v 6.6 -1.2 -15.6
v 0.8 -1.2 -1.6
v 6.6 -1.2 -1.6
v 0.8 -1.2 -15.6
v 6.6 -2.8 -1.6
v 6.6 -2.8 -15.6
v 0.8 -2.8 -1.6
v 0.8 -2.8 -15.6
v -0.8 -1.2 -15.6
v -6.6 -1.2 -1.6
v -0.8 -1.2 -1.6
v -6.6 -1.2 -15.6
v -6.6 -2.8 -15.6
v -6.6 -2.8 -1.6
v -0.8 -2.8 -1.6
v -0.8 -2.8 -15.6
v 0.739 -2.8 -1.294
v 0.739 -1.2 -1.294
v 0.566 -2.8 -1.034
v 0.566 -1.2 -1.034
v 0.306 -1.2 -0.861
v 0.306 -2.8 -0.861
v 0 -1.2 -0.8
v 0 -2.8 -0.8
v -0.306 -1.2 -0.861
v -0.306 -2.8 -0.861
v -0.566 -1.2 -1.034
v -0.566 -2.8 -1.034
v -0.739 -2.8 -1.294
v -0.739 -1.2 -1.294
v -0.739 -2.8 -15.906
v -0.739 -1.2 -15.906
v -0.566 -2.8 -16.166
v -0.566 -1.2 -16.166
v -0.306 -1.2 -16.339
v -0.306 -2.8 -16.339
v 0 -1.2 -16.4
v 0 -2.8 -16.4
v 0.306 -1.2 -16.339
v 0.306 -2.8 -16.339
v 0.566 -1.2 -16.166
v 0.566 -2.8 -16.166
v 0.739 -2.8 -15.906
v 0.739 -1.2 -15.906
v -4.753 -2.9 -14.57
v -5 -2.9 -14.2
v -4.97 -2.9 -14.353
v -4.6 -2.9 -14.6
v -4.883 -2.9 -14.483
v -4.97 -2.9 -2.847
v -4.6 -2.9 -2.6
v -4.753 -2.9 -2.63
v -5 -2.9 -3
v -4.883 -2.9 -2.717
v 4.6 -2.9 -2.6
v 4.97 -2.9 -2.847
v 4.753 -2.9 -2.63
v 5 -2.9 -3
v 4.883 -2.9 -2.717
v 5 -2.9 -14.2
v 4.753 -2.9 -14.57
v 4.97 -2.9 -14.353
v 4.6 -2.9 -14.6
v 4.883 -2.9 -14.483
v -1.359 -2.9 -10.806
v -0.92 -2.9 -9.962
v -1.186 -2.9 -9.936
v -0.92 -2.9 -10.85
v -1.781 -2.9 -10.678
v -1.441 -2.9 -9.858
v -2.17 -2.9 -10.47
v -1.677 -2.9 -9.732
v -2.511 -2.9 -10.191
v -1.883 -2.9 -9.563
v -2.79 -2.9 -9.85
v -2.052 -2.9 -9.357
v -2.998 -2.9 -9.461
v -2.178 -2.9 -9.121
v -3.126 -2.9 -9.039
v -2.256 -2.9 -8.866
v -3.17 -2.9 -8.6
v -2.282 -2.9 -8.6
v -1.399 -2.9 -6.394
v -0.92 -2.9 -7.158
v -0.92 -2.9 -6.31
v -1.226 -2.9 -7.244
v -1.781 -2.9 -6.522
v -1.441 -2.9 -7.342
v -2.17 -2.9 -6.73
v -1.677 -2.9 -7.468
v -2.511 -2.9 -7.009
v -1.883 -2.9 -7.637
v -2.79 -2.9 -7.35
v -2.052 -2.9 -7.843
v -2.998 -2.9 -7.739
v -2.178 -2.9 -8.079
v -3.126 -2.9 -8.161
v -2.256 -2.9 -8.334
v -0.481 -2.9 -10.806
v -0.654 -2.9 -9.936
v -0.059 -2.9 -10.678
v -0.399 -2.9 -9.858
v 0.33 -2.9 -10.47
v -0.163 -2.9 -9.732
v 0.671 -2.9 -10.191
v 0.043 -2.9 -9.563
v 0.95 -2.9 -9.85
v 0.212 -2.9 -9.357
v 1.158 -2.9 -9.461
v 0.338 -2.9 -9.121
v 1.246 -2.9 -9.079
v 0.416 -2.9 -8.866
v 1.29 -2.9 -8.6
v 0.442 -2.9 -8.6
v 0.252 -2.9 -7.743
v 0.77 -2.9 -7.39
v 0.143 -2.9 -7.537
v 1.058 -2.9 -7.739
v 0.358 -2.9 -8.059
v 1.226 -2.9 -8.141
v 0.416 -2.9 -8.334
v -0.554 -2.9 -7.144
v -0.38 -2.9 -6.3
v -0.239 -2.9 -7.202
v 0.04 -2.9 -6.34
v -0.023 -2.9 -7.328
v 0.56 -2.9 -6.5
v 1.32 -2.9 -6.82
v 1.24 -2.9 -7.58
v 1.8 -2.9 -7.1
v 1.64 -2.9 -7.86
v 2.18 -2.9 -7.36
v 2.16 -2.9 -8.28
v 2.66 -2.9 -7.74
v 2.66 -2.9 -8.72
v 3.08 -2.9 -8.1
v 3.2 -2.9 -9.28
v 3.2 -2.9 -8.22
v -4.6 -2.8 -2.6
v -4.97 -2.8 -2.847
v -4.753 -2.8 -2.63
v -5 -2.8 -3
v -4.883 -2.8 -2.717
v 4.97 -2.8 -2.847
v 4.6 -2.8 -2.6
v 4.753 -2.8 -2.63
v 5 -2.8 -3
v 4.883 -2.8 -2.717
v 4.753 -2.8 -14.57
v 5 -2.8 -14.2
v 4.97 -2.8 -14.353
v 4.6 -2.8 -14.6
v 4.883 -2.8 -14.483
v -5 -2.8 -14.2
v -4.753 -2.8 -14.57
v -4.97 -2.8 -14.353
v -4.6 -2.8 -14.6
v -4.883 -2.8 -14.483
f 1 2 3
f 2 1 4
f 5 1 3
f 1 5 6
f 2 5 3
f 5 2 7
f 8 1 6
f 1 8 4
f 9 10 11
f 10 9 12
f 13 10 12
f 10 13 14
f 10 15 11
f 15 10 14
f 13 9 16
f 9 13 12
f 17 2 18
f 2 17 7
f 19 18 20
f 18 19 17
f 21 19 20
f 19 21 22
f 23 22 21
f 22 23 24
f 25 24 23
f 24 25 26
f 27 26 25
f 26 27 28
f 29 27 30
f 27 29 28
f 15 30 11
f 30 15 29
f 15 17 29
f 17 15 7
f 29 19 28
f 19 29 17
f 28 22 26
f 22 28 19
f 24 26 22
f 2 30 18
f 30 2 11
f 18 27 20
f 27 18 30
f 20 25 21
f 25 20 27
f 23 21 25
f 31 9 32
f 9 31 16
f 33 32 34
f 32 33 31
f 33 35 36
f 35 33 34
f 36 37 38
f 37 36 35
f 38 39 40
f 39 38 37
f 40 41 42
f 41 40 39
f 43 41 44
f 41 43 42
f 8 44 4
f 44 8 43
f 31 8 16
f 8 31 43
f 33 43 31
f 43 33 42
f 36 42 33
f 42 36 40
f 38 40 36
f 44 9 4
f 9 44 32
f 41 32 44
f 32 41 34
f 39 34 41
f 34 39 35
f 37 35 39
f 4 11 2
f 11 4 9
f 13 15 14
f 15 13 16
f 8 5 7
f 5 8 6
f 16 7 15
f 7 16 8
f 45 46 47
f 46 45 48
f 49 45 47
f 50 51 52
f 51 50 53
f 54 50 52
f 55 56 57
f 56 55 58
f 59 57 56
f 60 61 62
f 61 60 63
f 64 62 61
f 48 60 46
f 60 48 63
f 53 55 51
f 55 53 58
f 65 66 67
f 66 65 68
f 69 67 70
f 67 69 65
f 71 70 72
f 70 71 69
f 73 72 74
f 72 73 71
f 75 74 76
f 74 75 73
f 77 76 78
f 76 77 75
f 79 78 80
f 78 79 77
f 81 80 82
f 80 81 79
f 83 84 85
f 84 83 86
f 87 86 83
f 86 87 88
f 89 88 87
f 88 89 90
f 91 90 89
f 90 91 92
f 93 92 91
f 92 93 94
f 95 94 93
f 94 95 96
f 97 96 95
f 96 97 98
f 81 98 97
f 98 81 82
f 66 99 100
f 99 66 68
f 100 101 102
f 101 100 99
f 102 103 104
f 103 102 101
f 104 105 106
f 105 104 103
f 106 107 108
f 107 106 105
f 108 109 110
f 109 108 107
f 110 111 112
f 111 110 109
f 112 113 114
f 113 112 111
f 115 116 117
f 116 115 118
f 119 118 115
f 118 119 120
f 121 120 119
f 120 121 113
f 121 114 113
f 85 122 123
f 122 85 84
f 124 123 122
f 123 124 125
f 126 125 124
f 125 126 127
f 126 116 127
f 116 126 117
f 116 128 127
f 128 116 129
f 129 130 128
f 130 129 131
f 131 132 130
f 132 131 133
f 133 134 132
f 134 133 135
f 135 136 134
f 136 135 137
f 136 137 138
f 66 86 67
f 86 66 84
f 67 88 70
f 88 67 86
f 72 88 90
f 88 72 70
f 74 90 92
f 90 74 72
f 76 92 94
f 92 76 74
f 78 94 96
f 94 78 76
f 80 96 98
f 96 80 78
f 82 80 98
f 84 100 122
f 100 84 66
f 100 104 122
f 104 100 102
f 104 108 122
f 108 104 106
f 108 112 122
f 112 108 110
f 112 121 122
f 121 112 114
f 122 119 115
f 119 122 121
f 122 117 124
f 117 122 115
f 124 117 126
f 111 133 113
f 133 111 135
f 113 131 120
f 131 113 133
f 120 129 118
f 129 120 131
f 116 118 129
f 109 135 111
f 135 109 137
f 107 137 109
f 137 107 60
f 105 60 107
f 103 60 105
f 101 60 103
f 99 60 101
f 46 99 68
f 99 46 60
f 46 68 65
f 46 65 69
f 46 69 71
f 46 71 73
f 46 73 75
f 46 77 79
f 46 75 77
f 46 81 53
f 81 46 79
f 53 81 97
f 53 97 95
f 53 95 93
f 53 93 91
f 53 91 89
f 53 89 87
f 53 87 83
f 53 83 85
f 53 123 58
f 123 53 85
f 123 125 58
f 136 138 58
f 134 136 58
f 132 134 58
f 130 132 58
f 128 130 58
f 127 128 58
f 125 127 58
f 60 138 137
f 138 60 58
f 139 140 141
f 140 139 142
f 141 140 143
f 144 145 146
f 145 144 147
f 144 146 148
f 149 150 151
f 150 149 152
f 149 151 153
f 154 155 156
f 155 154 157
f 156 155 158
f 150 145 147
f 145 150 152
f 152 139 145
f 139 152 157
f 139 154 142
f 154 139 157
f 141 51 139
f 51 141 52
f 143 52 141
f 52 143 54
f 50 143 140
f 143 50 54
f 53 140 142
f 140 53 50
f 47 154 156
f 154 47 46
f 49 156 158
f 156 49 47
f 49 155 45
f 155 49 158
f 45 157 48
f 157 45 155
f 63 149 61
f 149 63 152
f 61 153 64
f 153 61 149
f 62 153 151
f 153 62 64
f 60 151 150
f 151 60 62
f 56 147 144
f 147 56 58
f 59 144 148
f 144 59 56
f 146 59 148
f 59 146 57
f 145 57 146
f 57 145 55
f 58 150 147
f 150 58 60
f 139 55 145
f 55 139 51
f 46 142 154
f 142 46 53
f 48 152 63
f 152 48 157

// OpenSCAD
// file: ../p/2-4edge.scad
use <../lib.scad>
function ldraw_lib__2_4edge() = [
// 0 Circle 0.5
// 0 Name: 2-4edge.dat
// 0 Author: James Jessiman
// 0 !LDRAW_ORG Primitive UPDATE 2017-01
// 0 !LICENSE Licensed under CC BY 4.0 : see CAreadme.txt
// 
// 0 BFC CERTIFY CCW
  [0,"BFC","CERTIFY"],
  [0,"BFC","CCW"],
// 
// 0 !HISTORY 2007-06-24 [PTadmin] Header formatted for Contributor Agreement
// 0 !HISTORY 2008-07-01 [PTadmin] Official Update 2008-01
// 0 !HISTORY 2017-01-15 [Steffen] BFCed
// 0 !HISTORY 2017-12-30 [PTadmin] Official Update 2017-01
// 
// 
// 2 24 1 0 0 0.9239 0 0.3827
  [2,24,1,0,0,0.9239,0,0.3827],
// 2 24 0.9239 0 0.3827 0.7071 0 0.7071
  [2,24,0.9239,0,0.3827,0.7071,0,0.7071],
// 2 24 0.7071 0 0.7071 0.3827 0 0.9239
  [2,24,0.7071,0,0.7071,0.3827,0,0.9239],
// 2 24 0.3827 0 0.9239 0 0 1
  [2,24,0.3827,0,0.9239,0,0,1],
// 2 24 0 0 1 -0.3827 0 0.9239
  [2,24,0,0,1,-0.3827,0,0.9239],
// 2 24 -0.3827 0 0.9239 -0.7071 0 0.7071
  [2,24,-0.3827,0,0.9239,-0.7071,0,0.7071],
// 2 24 -0.7071 0 0.7071 -0.9239 0 0.3827
  [2,24,-0.7071,0,0.7071,-0.9239,0,0.3827],
// 2 24 -0.9239 0 0.3827 -1 0 0
  [2,24,-0.9239,0,0.3827,-1,0,0],
];
module ldraw_lib__2_4edge(step=0, col=false, unit=2/5, alt=false, line=0.2, solid=!$preview)
    makepoly(ldraw_lib__2_4edge(), step=step, col=col, unit=unit, alt=alt, line=line, solid=solid);
ldraw_lib__2_4edge(line=0.2);
// file: ../p/2-4cyli.scad
use <../lib.scad>
function ldraw_lib__2_4cyli() = [
// 0 Cylinder 0.5
// 0 Name: 2-4cyli.dat
// 0 Author: James Jessiman
// 0 !LDRAW_ORG Primitive UPDATE 2005-01
// 0 !LICENSE Licensed under CC BY 4.0 : see CAreadme.txt
// 
// 0 BFC CERTIFY CCW
  [0,"BFC","CERTIFY"],
  [0,"BFC","CCW"],
// 
// 0 !HISTORY 2002-03-23 [sbliss] Added BFC statement; compacted code
// 0 !HISTORY 2002-04-25 [PTadmin] Official Update 2002-02
// 0 !HISTORY 2004-12-11 [nielsk] Recreated using Primitive Generator, Edge lines fixed, BFC changed to CCW
// 0 !HISTORY 2005-12-28 [PTadmin] Official Update 2005-01
// 0 !HISTORY 2007-06-24 [PTadmin] Header formatted for Contributor Agreement
// 0 !HISTORY 2008-07-01 [PTadmin] Official Update 2008-01
// 
// 
// 4 16 .9239 1 .3827 .9239 0 .3827 1 0 0 1 1 0
  [4,16,.9239,1,.3827,.9239,0,.3827,1,0,0,1,1,0],
// 4 16 .7071 1 .7071 .7071 0 .7071 .9239 0 .3827 .9239 1 .3827
  [4,16,.7071,1,.7071,.7071,0,.7071,.9239,0,.3827,.9239,1,.3827],
// 4 16 .3827 1 .9239 .3827 0 .9239 .7071 0 .7071 .7071 1 .7071
  [4,16,.3827,1,.9239,.3827,0,.9239,.7071,0,.7071,.7071,1,.7071],
// 4 16 0 1 1 0 0 1 .3827 0 .9239 .3827 1 .9239
  [4,16,0,1,1,0,0,1,.3827,0,.9239,.3827,1,.9239],
// 4 16 -.3827 1 .9239 -.3827 0 .9239 0 0 1 0 1 1
  [4,16,-.3827,1,.9239,-.3827,0,.9239,0,0,1,0,1,1],
// 4 16 -.7071 1 .7071 -.7071 0 .7071 -.3827 0 .9239 -.3827 1 .9239
  [4,16,-.7071,1,.7071,-.7071,0,.7071,-.3827,0,.9239,-.3827,1,.9239],
// 4 16 -.9239 1 .3827 -.9239 0 .3827 -.7071 0 .7071 -.7071 1 .7071
  [4,16,-.9239,1,.3827,-.9239,0,.3827,-.7071,0,.7071,-.7071,1,.7071],
// 4 16 -1 1 0 -1 0 0 -.9239 0 .3827 -.9239 1 .3827
  [4,16,-1,1,0,-1,0,0,-.9239,0,.3827,-.9239,1,.3827],
// 5 24 1 1 0 1 0 0 1 1 -.4142 .9239 1 .3827
  [5,24,1,1,0,1,0,0,1,1,-.4142,.9239,1,.3827],
// 5 24 .9239 1 .3827 .9239 0 .3827 1 1 0 .7071 1 .7071
  [5,24,.9239,1,.3827,.9239,0,.3827,1,1,0,.7071,1,.7071],
// 5 24 .7071 1 .7071 .7071 0 .7071 .9239 1 .3827 .3827 1 .9239
  [5,24,.7071,1,.7071,.7071,0,.7071,.9239,1,.3827,.3827,1,.9239],
// 5 24 .3827 1 .9239 .3827 0 .9239 .7071 1 .7071 0 1 1
  [5,24,.3827,1,.9239,.3827,0,.9239,.7071,1,.7071,0,1,1],
// 5 24 0 1 1 0 0 1 .3827 1 .9239 -.3827 1 .9239
  [5,24,0,1,1,0,0,1,.3827,1,.9239,-.3827,1,.9239],
// 5 24 -.3827 1 .9239 -.3827 0 .9239 0 1 1 -.7071 1 .7071
  [5,24,-.3827,1,.9239,-.3827,0,.9239,0,1,1,-.7071,1,.7071],
// 5 24 -.7071 1 .7071 -.7071 0 .7071 -.3827 1 .9239 -.9239 1 .3827
  [5,24,-.7071,1,.7071,-.7071,0,.7071,-.3827,1,.9239,-.9239,1,.3827],
// 5 24 -.9239 1 .3827 -.9239 0 .3827 -.7071 1 .7071 -1 1 0
  [5,24,-.9239,1,.3827,-.9239,0,.3827,-.7071,1,.7071,-1,1,0],
// 5 24 -1 1 0 -1 0 0 -.9239 1 .3827 -1 1 -.4142
  [5,24,-1,1,0,-1,0,0,-.9239,1,.3827,-1,1,-.4142],
// 0
];
module ldraw_lib__2_4cyli(step=0, col=false, unit=2/5, alt=false, line=0.2, solid=!$preview)
    makepoly(ldraw_lib__2_4cyli(), step=step, col=col, unit=unit, alt=alt, line=line, solid=solid);
ldraw_lib__2_4cyli(line=0.2);
// file: ../p/box4-4a.scad
use <../lib.scad>
function ldraw_lib__box4_4a() = [
// 0 Box with  4 Faces without  4 Adjacent Edges
// 0 Name: box4-4a.dat
// 0 Author: Willy Tschager [Holly-Wood]
// 0 !LDRAW_ORG Primitive UPDATE 2024-01
// 0 !LICENSE Licensed under CC BY 4.0 : see CAreadme.txt
// 
// 0 BFC CERTIFY CCW
  [0,"BFC","CERTIFY"],
  [0,"BFC","CCW"],
// 
// 0 !HISTORY 1998-07-15 [PTadmin] Official Update 1998-07
// 0 !HISTORY 2002-12-13 [hafhead] Made BFC compliant
// 0 !HISTORY 2003-03-12 [PTadmin] Official Update 2003-01
// 0 !HISTORY 2007-06-24 [PTadmin] Header formatted for Contributor Agreement
// 0 !HISTORY 2008-07-01 [PTadmin] Official Update 2008-01
// 0 !HISTORY 2012-02-16 [Philo] Changed to CCW
// 0 !HISTORY 2012-03-30 [PTadmin] Official Update 2012-01
// 0 !HISTORY 2024-01-03 [Holly-Wood] Complete re-write, original by Manfred Moolhuysen
// 0 !HISTORY 2024-01-29 [OrionP] Official Update 2024-01
// 
// 2 24 -1 1 -1 -1 1 1
  [2,24,-1,1,-1,-1,1,1],
// 2 24 1 1 1 1 1 -1
  [2,24,1,1,1,1,1,-1],
// 2 24 -1 1 1 1 1 1
  [2,24,-1,1,1,1,1,1],
// 4 16 1 1 1 1 1 -1 -1 1 -1 -1 1 1
  [4,16,1,1,1,1,1,-1,-1,1,-1,-1,1,1],
// 
// 2 24 -1 0 -1 -1 0 1
  [2,24,-1,0,-1,-1,0,1],
// 4 16 -1 1 1 -1 1 -1 -1 0 -1 -1 0 1
  [4,16,-1,1,1,-1,1,-1,-1,0,-1,-1,0,1],
// 
// 2 24 1 0 1 1 0 -1
  [2,24,1,0,1,1,0,-1],
// 4 16 1 1 -1 1 1 1 1 0 1 1 0 -1
  [4,16,1,1,-1,1,1,1,1,0,1,1,0,-1],
// 
// 2 24 1 1 1 1 0 1
  [2,24,1,1,1,1,0,1],
// 2 24 -1 1 1 -1 0 1
  [2,24,-1,1,1,-1,0,1],
// 2 24 -1 0 1 1 0 1
  [2,24,-1,0,1,1,0,1],
// 4 16 1 1 1 -1 1 1 -1 0 1 1 0 1
  [4,16,1,1,1,-1,1,1,-1,0,1,1,0,1],
];
module ldraw_lib__box4_4a(step=0, col=false, unit=2/5, alt=false, line=0.2, solid=!$preview)
    makepoly(ldraw_lib__box4_4a(), step=step, col=col, unit=unit, alt=alt, line=line, solid=solid);
ldraw_lib__box4_4a(line=0.2);
// file: ../p/2-4cylo.scad
use <../lib.scad>
use <2-4cyli.scad>
use <2-4edge.scad>
function ldraw_lib__2_4cylo() = [
// 0 Cylinder Open 0.5
// 0 Name: 2-4cylo.dat
// 0 Author: Max Martin Richter [MMR1988]
// 0 !LDRAW_ORG Primitive UPDATE 2010-03
// 0 !LICENSE Licensed under CC BY 4.0 : see CAreadme.txt
// 
// 0 BFC CERTIFY CCW
  [0,"BFC","CERTIFY"],
  [0,"BFC","CCW"],
// 
// 0 !HISTORY 2010-12-31 [PTadmin] Official Update 2010-03
// 
// 
// 1 16 0 0 0 1 0 0 0 1 0 0 0 1 2-4edge.dat
  [1,16,0,0,0,1,0,0,0,1,0,0,0,1, ldraw_lib__2_4edge()],
// 1 16 0 1 0 1 0 0 0 1 0 0 0 1 2-4edge.dat
  [1,16,0,1,0,1,0,0,0,1,0,0,0,1, ldraw_lib__2_4edge()],
// 1 16 0 0 0 1 0 0 0 1 0 0 0 1 2-4cyli.dat
  [1,16,0,0,0,1,0,0,0,1,0,0,0,1, ldraw_lib__2_4cyli()],
];
module ldraw_lib__2_4cylo(step=0, col=false, unit=2/5, alt=false, line=0.2, solid=!$preview)
    makepoly(ldraw_lib__2_4cylo(), step=step, col=col, unit=unit, alt=alt, line=line, solid=solid);
ldraw_lib__2_4cylo(line=0.2);
// file: ../p/2-4chrd.scad
use <../lib.scad>
function ldraw_lib__2_4chrd() = [
// 0 Chord 0.5
// 0 Name: 2-4chrd.dat
// 0 Author: Philippe Hurbain [Philo]
// 0 !LDRAW_ORG Primitive UPDATE 2014-01
// 0 !LICENSE Licensed under CC BY 4.0 : see CAreadme.txt
// 
// 0 BFC CERTIFY CCW
  [0,"BFC","CERTIFY"],
  [0,"BFC","CCW"],
// 
// 0 !HISTORY 2014-06-21 [PTadmin] Official Update 2014-01
// 
// 
// 4 16 0.9239 0 0.3827 -0.9239 0 0.3827 -1 0 0 1 0 0
  [4,16,0.9239,0,0.3827,-0.9239,0,0.3827,-1,0,0,1,0,0],
// 4 16 0.7071 0 0.7071 -0.7071 0 0.7071 -0.9239 0 0.3827 0.9239 0 0.3827
  [4,16,0.7071,0,0.7071,-0.7071,0,0.7071,-0.9239,0,0.3827,0.9239,0,0.3827],
// 4 16 0.3827 0 0.9239 -0.3827 0 0.9239 -0.7071 0 0.7071 0.7071 0 0.7071
  [4,16,0.3827,0,0.9239,-0.3827,0,0.9239,-0.7071,0,0.7071,0.7071,0,0.7071],
// 3 16 0 0 1 -0.3827 0 0.9239 0.3827 0 0.9239
  [3,16,0,0,1,-0.3827,0,0.9239,0.3827,0,0.9239],
];
module ldraw_lib__2_4chrd(step=0, col=false, unit=2/5, alt=false, line=0.2, solid=!$preview)
    makepoly(ldraw_lib__2_4chrd(), step=step, col=col, unit=unit, alt=alt, line=line, solid=solid);
ldraw_lib__2_4chrd(line=0.2);
// file: ../p/1-4cyli.scad
use <../lib.scad>
function ldraw_lib__1_4cyli() = [
// 0 Cylinder 0.25
// 0 Name: 1-4cyli.dat
// 0 Author: James Jessiman
// 0 !LDRAW_ORG Primitive UPDATE 2012-01
// 0 !LICENSE Licensed under CC BY 4.0 : see CAreadme.txt
// 
// 0 BFC CERTIFY CCW
  [0,"BFC","CERTIFY"],
  [0,"BFC","CCW"],
// 
// 0 !HISTORY 2002-03-23 [sbliss] Added BFC statement.
// 0 !HISTORY 2002-04-25 [PTadmin] Official Update 2002-02
// 0 !HISTORY 2007-06-22 [PTadmin] Header formatted for Contributor Agreement
// 0 !HISTORY 2008-07-01 [PTadmin] Official Update 2008-01
// 0 !HISTORY 2012-02-16 [Philo] Changed to CCW
// 0 !HISTORY 2012-03-30 [PTadmin] Official Update 2012-01
// 
// 
// 4 16 1 1 0 0.9239 1 0.3827 0.9239 0 0.3827 1 0 0
  [4,16,1,1,0,0.9239,1,0.3827,0.9239,0,0.3827,1,0,0],
// 5 24 1 0 0 1 1 0 0.9239 0 0.3827 1 0 -1
  [5,24,1,0,0,1,1,0,0.9239,0,0.3827,1,0,-1],
// 4 16 0.9239 1 0.3827 0.7071 1 0.7071 0.7071 0 0.7071 0.9239 0 0.3827
  [4,16,0.9239,1,0.3827,0.7071,1,0.7071,0.7071,0,0.7071,0.9239,0,0.3827],
// 5 24 0.9239 0 0.3827 0.9239 1 0.3827 0.7071 0 0.7071 1 0 0
  [5,24,0.9239,0,0.3827,0.9239,1,0.3827,0.7071,0,0.7071,1,0,0],
// 4 16 0.7071 1 0.7071 0.3827 1 0.9239 0.3827 0 0.9239 0.7071 0 0.7071
  [4,16,0.7071,1,0.7071,0.3827,1,0.9239,0.3827,0,0.9239,0.7071,0,0.7071],
// 5 24 0.7071 0 0.7071 0.7071 1 0.7071 0.3827 0 0.9239 0.9239 0 0.3827
  [5,24,0.7071,0,0.7071,0.7071,1,0.7071,0.3827,0,0.9239,0.9239,0,0.3827],
// 4 16 0.3827 1 0.9239 0 1 1 0 0 1 0.3827 0 0.9239
  [4,16,0.3827,1,0.9239,0,1,1,0,0,1,0.3827,0,0.9239],
// 5 24 0.3827 0 0.9239 0.3827 1 0.9239 0 0 1 0.7071 0 0.7071
  [5,24,0.3827,0,0.9239,0.3827,1,0.9239,0,0,1,0.7071,0,0.7071],
// 5 24 0 0 1 0 1 1 0.3827 0 0.9239 -1 0 1
  [5,24,0,0,1,0,1,1,0.3827,0,0.9239,-1,0,1],
];
module ldraw_lib__1_4cyli(step=0, col=false, unit=2/5, alt=false, line=0.2, solid=!$preview)
    makepoly(ldraw_lib__1_4cyli(), step=step, col=col, unit=unit, alt=alt, line=line, solid=solid);
ldraw_lib__1_4cyli(line=0.2);
// file: ../p/1-4chrd.scad
use <../lib.scad>
function ldraw_lib__1_4chrd() = [
// 0 Chord 0.25
// 0 Name: 1-4chrd.dat
// 0 Author: Max Martin Richter [MMR1988]
// 0 !LDRAW_ORG Primitive UPDATE 2023-05
// 0 !LICENSE Licensed under CC BY 4.0 : see CAreadme.txt
// 
// 0 BFC CERTIFY CCW
  [0,"BFC","CERTIFY"],
  [0,"BFC","CCW"],
// 
// 0 !HISTORY 2004-04-22 [PTadmin] Official Update 2004-02
// 0 !HISTORY 2007-10-09 [PTadmin] Header formatted for Contributor Agreement
// 0 !HISTORY 2008-07-01 [PTadmin] Official Update 2008-01
// 0 !HISTORY 2012-08-02 [MMR1988] Re-creation with PrimGen2 and Rectifier
// 0 !HISTORY 2012-08-09 [PTadmin] Official Update 2012-02
// 0 !HISTORY 2023-10-27 [OrionP] Change author to MMR1988 from hafhead
// 0 !HISTORY 2023-10-31 [OrionP] Official Update 2023-05
// 
// 4 16 0.9239 0 0.3827 0.3827 0 0.9239 0 0 1 1 0 0
  [4,16,0.9239,0,0.3827,0.3827,0,0.9239,0,0,1,1,0,0],
// 3 16 0.7071 0 0.7071 0.3827 0 0.9239 0.9239 0 0.3827
  [3,16,0.7071,0,0.7071,0.3827,0,0.9239,0.9239,0,0.3827],
];
module ldraw_lib__1_4chrd(step=0, col=false, unit=2/5, alt=false, line=0.2, solid=!$preview)
    makepoly(ldraw_lib__1_4chrd(), step=step, col=col, unit=unit, alt=alt, line=line, solid=solid);
ldraw_lib__1_4chrd(line=0.2);
// file: s/60601s01.scad
use <../../lib.scad>
use <../../p/2-4chrd.scad>
use <../../p/2-4cylo.scad>
use <../../p/box4-4a.scad>
function ldraw_lib__s__60601s01() = [
// 0 ~Glass for Window  1 x  2 x  2 without Front Surface
// 0 Name: s\60601s01.dat
// 0 Author: Ulrich Röder [UR]
// 0 !LDRAW_ORG Subpart UPDATE 2019-01
// 0 !LICENSE Licensed under CC BY 4.0 : see CAreadme.txt
// 
// 0 BFC CERTIFY CCW
  [0,"BFC","CERTIFY"],
  [0,"BFC","CCW"],
// 
// 0 !HISTORY 2019-06-28 [PTadmin] Official Update 2019-01
// 
// 
// 1 16 9.25 21.5 -7 0 0 7.25 17.5 0 0 0 4 0 box4-4a.dat
  [1,16,9.25,21.5,-7,0,0,7.25,17.5,0,0,0,4,0, ldraw_lib__box4_4a()],
// 1 16 -9.25 21.5 -7 0 0 -7.25 17.5 0 0 0 4 0 box4-4a.dat
  [1,16,-9.25,21.5,-7,0,0,-7.25,17.5,0,0,0,4,0, ldraw_lib__box4_4a()],
// 1 16 0 4 -7 2 0 0 0 0 -2 0 4 0 2-4cylo.dat
  [1,16,0,4,-7,2,0,0,0,0,-2,0,4,0, ldraw_lib__2_4cylo()],
// 1 16 0 4 -7 2 0 0 0 0 -2 0 1 0 2-4chrd.dat
  [1,16,0,4,-7,2,0,0,0,0,-2,0,1,0, ldraw_lib__2_4chrd()],
// 1 16 0 4 -3 -2 0 0 0 0 -2 0 -1 0 2-4chrd.dat
  [1,16,0,4,-3,-2,0,0,0,0,-2,0,-1,0, ldraw_lib__2_4chrd()],
// 1 16 0 39 -7 -2 0 0 0 0 2 0 4 0 2-4cylo.dat
  [1,16,0,39,-7,-2,0,0,0,0,2,0,4,0, ldraw_lib__2_4cylo()],
// 1 16 0 39 -7 -2 0 0 0 0 2 0 1 0 2-4chrd.dat
  [1,16,0,39,-7,-2,0,0,0,0,2,0,1,0, ldraw_lib__2_4chrd()],
// 1 16 0 39 -3 2 0 0 0 0 2 0 -1 0 2-4chrd.dat
  [1,16,0,39,-3,2,0,0,0,0,2,0,-1,0, ldraw_lib__2_4chrd()],
// 4 16 -2 4 -3 2 4 -3 2 39 -3 -2 39 -3
  [4,16,-2,4,-3,2,4,-3,2,39,-3,-2,39,-3],
// 2 24 2 4 -3 2 4 -7
  [2,24,2,4,-3,2,4,-7],
// 2 24 -2 4 -3 -2 4 -7
  [2,24,-2,4,-3,-2,4,-7],
// 2 24 2 39 -3 2 39 -7
  [2,24,2,39,-3,2,39,-7],
// 2 24 -2 39 -3 -2 39 -7
  [2,24,-2,39,-3,-2,39,-7],
];
module ldraw_lib__s__60601s01(step=0, col=false, unit=2/5, alt=false, line=0.2, solid=!$preview)
    makepoly(ldraw_lib__s__60601s01(), step=step, col=col, unit=unit, alt=alt, line=line, solid=solid);
ldraw_lib__s__60601s01(line=0.2);
// file: 60601.scad
use <../lib.scad>
use <s/60601s01.scad>
function ldraw_lib__60601() = [
// 0 Glass for Window  1 x  2 x  2 without Sill
// 0 Name: 60601.dat
// 0 Author: Michael Heidemann [mikeheide]
// 0 !LDRAW_ORG Part UPDATE 2019-01
// 0 !LICENSE Licensed under CC BY 4.0 : see CAreadme.txt
// 
// 0 BFC CERTIFY CCW
  [0,"BFC","CERTIFY"],
  [0,"BFC","CCW"],
// 
// 0 !HISTORY 2010-12-31 [PTadmin] Official Update 2010-03
// 0 !HISTORY 2012-03-06 [gregteft] Updated to increase primitive use and correct inset for glass.
// 0 !HISTORY 2012-03-30 [PTadmin] Official Update 2012-01
// 0 !HISTORY 2018-10-02 [UR] Updated to insert Subfile
// 0 !HISTORY 2019-06-28 [PTadmin] Official Update 2019-01
// 
// 
// 1 16 0 0 0 1 -0 0 0 1 0 0 0 1 s\60601s01.dat
  [1,16,0,0,0,1,-0,0,0,1,0,0,0,1, ldraw_lib__s__60601s01()],
// 4 16 -2 39 -7 -2 4 -7 -16.5 4 -7 -16.5 39 -7
  [4,16,-2,39,-7,-2,4,-7,-16.5,4,-7,-16.5,39,-7],
// 4 16 2 4 -7 2 39 -7 16.5 39 -7 16.5 4 -7
  [4,16,2,4,-7,2,39,-7,16.5,39,-7,16.5,4,-7],
// 4 16 2 4 -7 -2 4 -7 -2 39 -7 2 39 -7
  [4,16,2,4,-7,-2,4,-7,-2,39,-7,2,39,-7],
];
module ldraw_lib__60601(step=0, col=false, unit=2/5, alt=false, line=0.2, solid=!$preview)
    makepoly(ldraw_lib__60601(), step=step, col=col, unit=unit, alt=alt, line=line, solid=solid);
ldraw_lib__60601(line=0.2);
// main file
use <../lib.scad>
use <60601.scad>
use <6196575o.scad>
function ldraw_lib__60601d01() = [
// 0 Glass for Window  1 x  2 x  2 without Sill with White "9" on Black Background Sticker
// 0 Name: 60601d01.dat
// 0 Author: Evert-Jan Boer [ejboer]
// 0 !LDRAW_ORG Shortcut UPDATE 2024-08
// 0 !LICENSE Licensed under CC BY 4.0 : see CAreadme.txt
// 
// 0 BFC CERTIFY CCW
  [0,"BFC","CERTIFY"],
  [0,"BFC","CCW"],
// 
// 0 !CATEGORY Sticker Shortcut
// 0 !KEYWORDS Bricklink 60601pb019, London Bus, set 10258
// 
// 0 !HISTORY 2024-09-30 [OrionP] Official Update 2024-08
// 
// 1 16 0 0 0 1 0 0 0 1 0 0 0 1 60601.dat
  [1,16,0,0,0,1,0,0,0,1,0,0,0,1, ldraw_lib__60601()],
// 1 15 0 21.5 -7 0 0 -1 -1 0 0 0 1 0 6196575o.dat
  [1,15,0,21.5,-7,0,0,-1,-1,0,0,0,1,0, ldraw_lib__6196575o()],
];
module ldraw_lib__60601d01(step=0, col=false, unit=2/5, alt=false, line=0.2, solid=!$preview)
    makepoly(ldraw_lib__60601d01(), step=step, col=col, unit=unit, alt=alt, line=line, solid=solid);
ldraw_lib__60601d01(line=0.2);
